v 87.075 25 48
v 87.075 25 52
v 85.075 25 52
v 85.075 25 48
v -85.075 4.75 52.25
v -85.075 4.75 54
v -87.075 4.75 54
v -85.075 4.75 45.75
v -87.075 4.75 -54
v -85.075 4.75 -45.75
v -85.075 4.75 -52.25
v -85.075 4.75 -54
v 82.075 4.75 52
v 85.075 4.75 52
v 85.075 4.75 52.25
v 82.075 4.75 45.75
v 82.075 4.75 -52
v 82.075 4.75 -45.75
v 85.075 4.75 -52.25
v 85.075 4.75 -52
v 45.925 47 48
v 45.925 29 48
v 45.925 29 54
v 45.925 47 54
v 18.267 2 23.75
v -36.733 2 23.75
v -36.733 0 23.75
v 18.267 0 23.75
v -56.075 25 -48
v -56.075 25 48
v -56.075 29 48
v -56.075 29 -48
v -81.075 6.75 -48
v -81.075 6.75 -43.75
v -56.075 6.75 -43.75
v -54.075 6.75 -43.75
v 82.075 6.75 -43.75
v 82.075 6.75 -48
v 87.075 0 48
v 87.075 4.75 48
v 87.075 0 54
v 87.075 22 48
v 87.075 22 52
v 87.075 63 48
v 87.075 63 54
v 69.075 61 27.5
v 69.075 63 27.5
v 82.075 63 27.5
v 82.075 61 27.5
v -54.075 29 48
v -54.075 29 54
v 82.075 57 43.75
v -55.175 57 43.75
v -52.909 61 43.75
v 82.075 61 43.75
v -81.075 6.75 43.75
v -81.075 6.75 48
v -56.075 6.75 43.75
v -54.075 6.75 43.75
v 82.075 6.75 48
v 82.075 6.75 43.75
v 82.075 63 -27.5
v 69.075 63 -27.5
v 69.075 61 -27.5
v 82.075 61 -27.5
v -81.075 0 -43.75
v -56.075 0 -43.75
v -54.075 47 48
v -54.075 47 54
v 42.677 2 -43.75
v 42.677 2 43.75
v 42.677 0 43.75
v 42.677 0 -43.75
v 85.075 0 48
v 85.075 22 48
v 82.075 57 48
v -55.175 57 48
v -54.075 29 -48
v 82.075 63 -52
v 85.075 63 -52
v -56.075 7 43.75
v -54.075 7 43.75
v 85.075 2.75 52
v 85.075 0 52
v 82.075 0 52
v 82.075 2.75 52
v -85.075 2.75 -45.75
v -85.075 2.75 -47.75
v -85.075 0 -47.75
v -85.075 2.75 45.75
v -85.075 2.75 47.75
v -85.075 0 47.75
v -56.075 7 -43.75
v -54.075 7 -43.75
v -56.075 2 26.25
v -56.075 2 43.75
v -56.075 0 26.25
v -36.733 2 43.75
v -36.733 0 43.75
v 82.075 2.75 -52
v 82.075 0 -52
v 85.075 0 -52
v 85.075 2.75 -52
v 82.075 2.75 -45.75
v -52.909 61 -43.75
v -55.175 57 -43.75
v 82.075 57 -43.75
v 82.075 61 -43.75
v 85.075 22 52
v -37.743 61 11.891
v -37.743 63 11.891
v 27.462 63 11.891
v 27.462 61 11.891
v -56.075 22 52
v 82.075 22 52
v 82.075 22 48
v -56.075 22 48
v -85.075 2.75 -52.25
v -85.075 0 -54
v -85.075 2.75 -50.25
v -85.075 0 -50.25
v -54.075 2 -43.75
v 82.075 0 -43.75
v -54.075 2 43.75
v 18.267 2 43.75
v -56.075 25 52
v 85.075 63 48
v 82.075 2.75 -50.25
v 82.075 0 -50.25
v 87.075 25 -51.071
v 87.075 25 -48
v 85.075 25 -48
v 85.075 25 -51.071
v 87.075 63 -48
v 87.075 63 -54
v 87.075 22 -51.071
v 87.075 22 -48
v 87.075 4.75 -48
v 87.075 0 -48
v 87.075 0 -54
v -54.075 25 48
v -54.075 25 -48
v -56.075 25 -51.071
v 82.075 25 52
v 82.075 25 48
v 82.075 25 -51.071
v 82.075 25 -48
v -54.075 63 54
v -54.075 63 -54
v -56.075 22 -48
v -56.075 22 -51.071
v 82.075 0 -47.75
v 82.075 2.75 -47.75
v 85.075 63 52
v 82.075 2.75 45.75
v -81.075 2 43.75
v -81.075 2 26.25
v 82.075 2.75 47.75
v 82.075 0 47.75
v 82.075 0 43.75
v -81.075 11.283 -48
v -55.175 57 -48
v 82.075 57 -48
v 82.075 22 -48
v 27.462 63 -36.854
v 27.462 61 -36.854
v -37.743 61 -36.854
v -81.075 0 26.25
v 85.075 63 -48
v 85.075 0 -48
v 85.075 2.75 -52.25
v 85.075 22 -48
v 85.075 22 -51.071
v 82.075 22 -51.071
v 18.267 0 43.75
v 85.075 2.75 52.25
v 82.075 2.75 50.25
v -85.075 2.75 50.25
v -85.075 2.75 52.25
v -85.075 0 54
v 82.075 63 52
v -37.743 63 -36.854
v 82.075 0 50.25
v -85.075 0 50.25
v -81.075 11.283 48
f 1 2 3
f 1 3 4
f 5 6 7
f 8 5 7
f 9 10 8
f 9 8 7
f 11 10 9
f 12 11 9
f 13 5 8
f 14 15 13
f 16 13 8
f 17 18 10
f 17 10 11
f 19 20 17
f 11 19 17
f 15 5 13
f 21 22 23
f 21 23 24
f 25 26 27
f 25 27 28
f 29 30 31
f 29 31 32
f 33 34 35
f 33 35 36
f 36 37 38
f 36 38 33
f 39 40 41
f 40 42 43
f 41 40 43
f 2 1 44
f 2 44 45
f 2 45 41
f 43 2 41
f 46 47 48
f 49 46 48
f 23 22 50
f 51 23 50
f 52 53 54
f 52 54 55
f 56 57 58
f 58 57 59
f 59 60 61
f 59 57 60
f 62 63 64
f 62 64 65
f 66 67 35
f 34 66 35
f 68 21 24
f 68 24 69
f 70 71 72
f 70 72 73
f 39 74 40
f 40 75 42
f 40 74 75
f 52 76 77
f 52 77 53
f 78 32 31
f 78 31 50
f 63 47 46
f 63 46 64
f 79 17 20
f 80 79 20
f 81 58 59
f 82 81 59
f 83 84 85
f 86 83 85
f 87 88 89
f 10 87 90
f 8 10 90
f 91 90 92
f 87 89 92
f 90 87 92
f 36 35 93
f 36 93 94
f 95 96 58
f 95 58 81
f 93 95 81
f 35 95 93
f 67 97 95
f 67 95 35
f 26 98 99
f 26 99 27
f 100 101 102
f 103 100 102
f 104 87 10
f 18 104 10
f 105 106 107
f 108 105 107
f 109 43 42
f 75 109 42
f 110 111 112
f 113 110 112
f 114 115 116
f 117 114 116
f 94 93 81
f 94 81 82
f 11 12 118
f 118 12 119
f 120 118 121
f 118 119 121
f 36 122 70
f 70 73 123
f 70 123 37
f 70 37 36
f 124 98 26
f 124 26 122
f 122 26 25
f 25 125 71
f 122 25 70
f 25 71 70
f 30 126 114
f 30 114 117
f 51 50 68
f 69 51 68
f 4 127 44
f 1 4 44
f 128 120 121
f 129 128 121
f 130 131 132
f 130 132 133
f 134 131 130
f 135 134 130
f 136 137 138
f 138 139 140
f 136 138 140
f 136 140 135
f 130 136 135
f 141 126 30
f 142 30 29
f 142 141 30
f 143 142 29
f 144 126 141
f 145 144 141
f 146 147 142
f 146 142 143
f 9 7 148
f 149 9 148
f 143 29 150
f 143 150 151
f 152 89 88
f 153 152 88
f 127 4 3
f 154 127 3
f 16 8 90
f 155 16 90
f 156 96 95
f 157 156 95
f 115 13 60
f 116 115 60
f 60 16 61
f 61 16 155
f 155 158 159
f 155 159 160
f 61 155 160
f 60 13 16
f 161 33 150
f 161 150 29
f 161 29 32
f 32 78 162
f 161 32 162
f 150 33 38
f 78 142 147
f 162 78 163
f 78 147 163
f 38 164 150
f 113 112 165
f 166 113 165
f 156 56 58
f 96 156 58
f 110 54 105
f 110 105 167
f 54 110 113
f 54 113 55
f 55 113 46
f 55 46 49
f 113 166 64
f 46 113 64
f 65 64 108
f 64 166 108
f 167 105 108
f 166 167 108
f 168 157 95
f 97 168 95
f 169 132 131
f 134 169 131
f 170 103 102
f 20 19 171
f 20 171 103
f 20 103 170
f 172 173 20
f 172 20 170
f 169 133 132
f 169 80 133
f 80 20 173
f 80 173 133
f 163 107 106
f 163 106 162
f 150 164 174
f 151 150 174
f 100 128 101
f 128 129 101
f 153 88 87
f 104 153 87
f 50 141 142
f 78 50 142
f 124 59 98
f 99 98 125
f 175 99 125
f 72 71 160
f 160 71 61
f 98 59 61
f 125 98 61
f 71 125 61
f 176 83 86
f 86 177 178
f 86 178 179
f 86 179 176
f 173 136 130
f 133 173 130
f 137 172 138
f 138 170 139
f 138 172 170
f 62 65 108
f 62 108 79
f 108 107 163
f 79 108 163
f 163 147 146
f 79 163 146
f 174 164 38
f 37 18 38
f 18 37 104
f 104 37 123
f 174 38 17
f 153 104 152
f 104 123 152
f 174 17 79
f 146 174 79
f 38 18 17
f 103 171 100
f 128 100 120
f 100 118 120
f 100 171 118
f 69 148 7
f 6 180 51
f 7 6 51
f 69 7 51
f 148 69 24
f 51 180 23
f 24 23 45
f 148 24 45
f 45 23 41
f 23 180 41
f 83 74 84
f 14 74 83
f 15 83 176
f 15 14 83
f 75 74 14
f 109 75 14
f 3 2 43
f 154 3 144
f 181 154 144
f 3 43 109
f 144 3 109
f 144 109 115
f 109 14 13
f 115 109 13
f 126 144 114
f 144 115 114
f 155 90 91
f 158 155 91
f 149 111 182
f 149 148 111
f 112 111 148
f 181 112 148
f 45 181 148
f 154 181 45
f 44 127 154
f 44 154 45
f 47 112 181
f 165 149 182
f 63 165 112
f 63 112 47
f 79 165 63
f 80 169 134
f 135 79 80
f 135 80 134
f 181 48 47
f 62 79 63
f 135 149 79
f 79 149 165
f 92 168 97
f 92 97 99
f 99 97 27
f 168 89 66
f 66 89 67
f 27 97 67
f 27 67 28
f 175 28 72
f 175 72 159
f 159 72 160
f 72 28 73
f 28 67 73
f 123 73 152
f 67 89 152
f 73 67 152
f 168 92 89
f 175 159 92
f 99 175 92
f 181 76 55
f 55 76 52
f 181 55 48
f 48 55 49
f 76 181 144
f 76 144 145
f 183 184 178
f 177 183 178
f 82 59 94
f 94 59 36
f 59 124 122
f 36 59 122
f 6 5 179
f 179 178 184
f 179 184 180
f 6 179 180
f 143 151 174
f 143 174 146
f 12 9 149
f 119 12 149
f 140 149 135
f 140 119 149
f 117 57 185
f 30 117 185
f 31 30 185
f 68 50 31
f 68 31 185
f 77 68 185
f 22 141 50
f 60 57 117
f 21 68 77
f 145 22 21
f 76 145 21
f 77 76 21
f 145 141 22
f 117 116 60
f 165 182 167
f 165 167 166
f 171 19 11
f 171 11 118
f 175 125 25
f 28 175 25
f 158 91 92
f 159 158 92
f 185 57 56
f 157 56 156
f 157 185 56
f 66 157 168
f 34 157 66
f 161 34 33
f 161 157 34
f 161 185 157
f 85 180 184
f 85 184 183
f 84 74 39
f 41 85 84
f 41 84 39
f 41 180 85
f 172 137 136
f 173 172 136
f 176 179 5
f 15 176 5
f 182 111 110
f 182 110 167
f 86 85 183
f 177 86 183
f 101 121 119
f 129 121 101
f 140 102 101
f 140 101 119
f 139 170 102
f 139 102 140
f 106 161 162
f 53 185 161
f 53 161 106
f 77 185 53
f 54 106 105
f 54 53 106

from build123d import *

# Parameters (mm, degrees)
SKETCH_1_W           = 174.15
SKETCH_1_H           = 108
EXTRUDE_1_DEPTH      = 63
CUT_EXTRUDE_2_DEPTH  = 174.15
CUT_EXTRUDE_3_REACH  = 122.279
SKETCH_6_W           = 2
SKETCH_6_H           = 108
SKETCH_7_W           = 96
SKETCH_7_H           = 50.25
CUT_EXTRUDE_5_DEPTH  = 168.15
SKETCH_8_W           = 87.5
SKETCH_8_H           = 4.75
CUT_EXTRUDE_6_DEPTH  = 168.15
SKETCH_10_W          = 168.15
SKETCH_10_H          = 87.5
CUT_EXTRUDE_8_DEPTH  = 59
SKETCH_12_W          = 168.15
SKETCH_12_H          = 96
EXTRUDE_2_DEPTH      = 2
SKETCH_15_W          = 25
SKETCH_15_H          = 70
SKETCH_15_W_2        = 55
SKETCH_15_H_2        = 20
SKETCH_15_W_3        = 44.398131355
SKETCH_15_H_3        = 87.5
CUT_EXTRUDE_9_DEPTH  = 2
SKETCH_16_W          = 25
SKETCH_16_H          = 96
SKETCH_16_W_2        = 32.283516817
CUT_EXTRUDE_10_DEPTH = 2
SKETCH_17_W          = 2
SKETCH_17_H          = 96
EXTRUDE_3_DEPTH      = 5
SKETCH_18_W          = 2
SKETCH_18_H          = 87.5
EXTRUDE_4_DEPTH      = 5
SKETCH_19_W          = 100
SKETCH_19_H          = 18
CUT_EXTRUDE_11_DEPTH = 6
CUT_EXTRUDE_12_REACH = 154.365
EXTRUDE_5_REACH      = 154.365
SKETCH_23_W          = 65.205598619
SKETCH_23_H          = 48.744694075
CUT_EXTRUDE_13_DEPTH = 2
CUT_EXTRUDE_START    = -63
CUT_EXTRUDE_14_DEPTH = 63
SKETCH_28_W          = 2
SKETCH_28_H          = 4.25
EXTRUDE_6_DEPTH      = 4.75
SKETCH_31_W          = 13
SKETCH_31_H          = 55
CUT_EXTRUDE_15_DEPTH = 10
SKETCH_34_W          = 103.070926165
SKETCH_34_H          = 3
CUT_EXTRUDE_16_DEPTH = 143.15


with BuildPart() as part:
    # 스케치1 → 보스-돌출1 (new body)
    with BuildSketch(Plane(origin=(0, 0, 0), x_dir=(1, 0, 0), z_dir=(0, 1, 0))):
        Rectangle(SKETCH_1_W, SKETCH_1_H)
    extrude(amount=EXTRUDE_1_DEPTH)

    # 스케치5 → 컷-돌출2 (cut)
    with BuildSketch(Plane.ZY.offset(87.075)):
        Polygon((-48, 0), (-47.75, 0), (-47.75, 2.75), (-45.75, 2.75), (-45.75, 4.75), (-52.25, 4.75), (-52.25, 2.75), (-50.25, 2.75), (-50.25, 0), (-50, 0), (-50, 3), (-52, 3), (-52, 4.5), (-46, 4.5), (-46, 3), (-48, 3), align=None)
        Polygon((-50, 0), (-48, 0), (-48, 3), (-46, 3), (-46, 4.5), (-52, 4.5), (-52, 3), (-50, 3), align=None)
        Polygon((50, 3), (50, 0), (50.25, 0), (50.25, 2.75), (52.25, 2.75), (52.25, 4.75), (45.75, 4.75), (45.75, 2.75), (47.75, 2.75), (47.75, 0), (48, 0), (48, 3), (46, 3), (46, 4.5), (52, 4.5), (52, 3), align=None)
        Polygon((48, 0), (50, 0), (50, 3), (52, 3), (52, 4.5), (46, 4.5), (46, 3), (48, 3), align=None)
    extrude(amount=-CUT_EXTRUDE_2_DEPTH, mode=Mode.SUBTRACT)

    # 컷-돌출3: up to this face of the body (flat: up to its plane)
    cut_extrude_3_end = Plane(part.part.faces().sort_by_distance((0, 4.75, 49))[0])
    # 스케치6 → 컷-돌출3 (cut, up to the picked face)
    with BuildSketch(Plane.XZ, mode=Mode.PRIVATE) as cut_extrude_3_sk1:
        with Locations((-86.075, 0)):
            Rectangle(SKETCH_6_W, SKETCH_6_H)
    cut_extrude_3_tool1 = split(extrude(cut_extrude_3_sk1.sketch, amount=-CUT_EXTRUDE_3_REACH, mode=Mode.PRIVATE), bisect_by=cut_extrude_3_end, keep=Keep.BOTH, mode=Mode.PRIVATE)
    add(cut_extrude_3_tool1.solids().sort_by(Axis((-86.075, 0, 0), (0, 1, 0)))[0], mode=Mode.SUBTRACT)

    # 스케치7 → 컷-돌출5 (cut)
    with BuildSketch(Plane(origin=(87.075, 0, 0), x_dir=(0, 0, -1), z_dir=(1, 0, 0))):
        with Locations((0, 31.875)):
            Rectangle(SKETCH_7_W, SKETCH_7_H)
    extrude(amount=-CUT_EXTRUDE_5_DEPTH, mode=Mode.SUBTRACT)

    # 스케치8 → 컷-돌출6 (cut)
    with BuildSketch(Plane(origin=(87.075, 0, 0), x_dir=(0, 0, -1), z_dir=(1, 0, 0))):
        with Locations((0, 4.375)):
            Rectangle(SKETCH_8_W, SKETCH_8_H)
    extrude(amount=-CUT_EXTRUDE_6_DEPTH, mode=Mode.SUBTRACT)

    # 스케치10 → 컷-돌출8 (cut)
    with BuildSketch(Plane(origin=(0, 2, 0), x_dir=(1, 0, 0), z_dir=(0, 1, 0))):
        with Locations((3, 0)):
            Rectangle(SKETCH_10_W, SKETCH_10_H)
    extrude(amount=CUT_EXTRUDE_8_DEPTH, mode=Mode.SUBTRACT)

    # 스케치12 → 보스-돌출2 (add)
    with BuildSketch(Plane(origin=(0, 24, 0), x_dir=(-1, 0, 0), z_dir=(0, -1, 0))):
        with Locations((-3, 0)):
            Rectangle(SKETCH_12_W, SKETCH_12_H)
    extrude(amount=EXTRUDE_2_DEPTH)

    # 스케치15 → 컷-돌출9 (cut)
    with BuildSketch(Plane(origin=(0, 2, 0), x_dir=(1, 0, 0), z_dir=(0, 1, 0))):
        with Locations((-68.575, 8.75)):
            Rectangle(SKETCH_15_W, SKETCH_15_H)
        with Locations((-9.233175572, -33.75)):
            Rectangle(SKETCH_15_W_2, SKETCH_15_H_2)
        with Locations((64.875934323, 0)):
            Rectangle(SKETCH_15_W_3, SKETCH_15_H_3)
    extrude(amount=-CUT_EXTRUDE_9_DEPTH, mode=Mode.SUBTRACT)

    # 스케치16 → 컷-돌출10 (cut)
    with BuildSketch(Plane(origin=(0, 24, 0), x_dir=(1, 0, 0), z_dir=(0, 1, 0))):
        with Locations((-68.575, 0)):
            Rectangle(SKETCH_16_W, SKETCH_16_H)
        with Locations((70.933241592, 0)):
            Rectangle(SKETCH_16_W_2, SKETCH_16_H)
    extrude(amount=-CUT_EXTRUDE_10_DEPTH, mode=Mode.SUBTRACT)

    # 스케치17 → 보스-돌출3 (add)
    with BuildSketch(Plane(origin=(0, 24, 0), x_dir=(1, 0, 0), z_dir=(0, 1, 0))):
        with Locations((-55.075, 0)):
            Rectangle(SKETCH_17_W, SKETCH_17_H)
    extrude(amount=EXTRUDE_3_DEPTH)

    # 스케치18 → 보스-돌출4 (add)
    with BuildSketch(Plane(origin=(0, 2, 0), x_dir=(1, 0, 0), z_dir=(0, 1, 0))):
        with Locations((-55.075, 0)):
            Rectangle(SKETCH_18_W, SKETCH_18_H)
    extrude(amount=EXTRUDE_4_DEPTH)

    # 스케치19 → 컷-돌출11 (cut)
    with BuildSketch(Plane(origin=(0, 0, 48), x_dir=(-1, 0, 0), z_dir=(0, 0, -1))):
        with Locations((4.075, 38)):
            Rectangle(SKETCH_19_W, SKETCH_19_H)
    extrude(amount=-CUT_EXTRUDE_11_DEPTH, mode=Mode.SUBTRACT)

    # 컷-돌출12: up to this face of the body (flat: up to its plane)
    cut_extrude_12_end = Plane(part.part.faces().sort_by_distance((0.074595533, 31.525240719, -54))[0])
    # 스케치20 → 컷-돌출12 (cut, up to the picked face)
    with BuildSketch(Plane.XY.offset(54), mode=Mode.PRIVATE) as cut_extrude_12_sk1:
        Polygon((-87.075, 4.75), (-54.075, 63), (-87.075, 63), align=None)
    cut_extrude_12_tool1 = split(extrude(cut_extrude_12_sk1.sketch, amount=-CUT_EXTRUDE_12_REACH, mode=Mode.PRIVATE), bisect_by=cut_extrude_12_end, keep=Keep.BOTH, mode=Mode.PRIVATE)
    add(cut_extrude_12_tool1.solids().sort_by(Axis((-76.075, 43.583333, 54), (0, 0, -1)))[0], mode=Mode.SUBTRACT)

    # 보스-돌출5: up to this face of the body (flat: up to its plane)
    extrude_5_end = Plane(part.part.faces().sort_by_distance((7.392919772, 30.366402897, -54))[0])
    # 스케치21 → 보스-돌출5 (add, up to the picked face)
    with BuildSketch(Plane.XY.offset(54), mode=Mode.PRIVATE) as extrude_5_sk1:
        Polygon((-87.075, 4.75), (-84.776349095, 4.75), (-51.776349095, 63), (-54.075, 63), align=None)
    extrude_5_tool1 = split(extrude(extrude_5_sk1.sketch, amount=-EXTRUDE_5_REACH, mode=Mode.PRIVATE), bisect_by=extrude_5_end, keep=Keep.BOTH, mode=Mode.PRIVATE)
    add(extrude_5_tool1.solids().sort_by(Axis((-69.425675, 33.875, 54), (0, 0, -1)))[0])

    # 스케치23 → 컷-돌출13 (cut)
    with BuildSketch(Plane(origin=(0, 63, 0), x_dir=(1, 0, 0), z_dir=(0, 1, 0))):
        with Locations((-5.140341164, 12.481591832)):
            Rectangle(SKETCH_23_W, SKETCH_23_H)
    extrude(amount=-CUT_EXTRUDE_13_DEPTH, mode=Mode.SUBTRACT)

    # 스케치26 → 컷-돌출14 (cut)
    with BuildSketch(Plane(origin=(0, 63, 0), x_dir=(1, 0, 0), z_dir=(0, 1, 0)).offset(CUT_EXTRUDE_START)):
        Polygon((82.075, 52), (85.075, 52), (85.075, 48), (87.075, 48), (87.075, -48), (85.075, -48), (85.075, -52), (82.075, -52), align=None)
    extrude(amount=CUT_EXTRUDE_14_DEPTH, mode=Mode.SUBTRACT)

    # 스케치28 → 보스-돌출6 (add)
    with BuildSketch(Plane.XZ.offset(-4.75)):
        with Locations((86.075, 50.125)):
            Rectangle(SKETCH_28_W, SKETCH_28_H)
        with Locations((86.075, -50.125)):
            Rectangle(SKETCH_28_W, SKETCH_28_H)
    extrude(amount=EXTRUDE_6_DEPTH)

    # 스케치31 → 컷-돌출15 (cut)
    with BuildSketch(Plane(origin=(0, 63, 0), x_dir=(1, 0, 0), z_dir=(0, 1, 0))):
        with Locations((75.575, 0)):
            Rectangle(SKETCH_31_W, SKETCH_31_H)
    extrude(amount=-CUT_EXTRUDE_15_DEPTH, mode=Mode.SUBTRACT)

    # 스케치34 → 컷-돌출16 (cut)
    with BuildSketch(Plane(origin=(87.075, 0, 0), x_dir=(0, 0, -1), z_dir=(1, 0, 0))):
        with Locations((-0.464536917, 23.5)):
            Rectangle(SKETCH_34_W, SKETCH_34_H)
    extrude(amount=-CUT_EXTRUDE_16_DEPTH, mode=Mode.SUBTRACT)


solid = part.part
